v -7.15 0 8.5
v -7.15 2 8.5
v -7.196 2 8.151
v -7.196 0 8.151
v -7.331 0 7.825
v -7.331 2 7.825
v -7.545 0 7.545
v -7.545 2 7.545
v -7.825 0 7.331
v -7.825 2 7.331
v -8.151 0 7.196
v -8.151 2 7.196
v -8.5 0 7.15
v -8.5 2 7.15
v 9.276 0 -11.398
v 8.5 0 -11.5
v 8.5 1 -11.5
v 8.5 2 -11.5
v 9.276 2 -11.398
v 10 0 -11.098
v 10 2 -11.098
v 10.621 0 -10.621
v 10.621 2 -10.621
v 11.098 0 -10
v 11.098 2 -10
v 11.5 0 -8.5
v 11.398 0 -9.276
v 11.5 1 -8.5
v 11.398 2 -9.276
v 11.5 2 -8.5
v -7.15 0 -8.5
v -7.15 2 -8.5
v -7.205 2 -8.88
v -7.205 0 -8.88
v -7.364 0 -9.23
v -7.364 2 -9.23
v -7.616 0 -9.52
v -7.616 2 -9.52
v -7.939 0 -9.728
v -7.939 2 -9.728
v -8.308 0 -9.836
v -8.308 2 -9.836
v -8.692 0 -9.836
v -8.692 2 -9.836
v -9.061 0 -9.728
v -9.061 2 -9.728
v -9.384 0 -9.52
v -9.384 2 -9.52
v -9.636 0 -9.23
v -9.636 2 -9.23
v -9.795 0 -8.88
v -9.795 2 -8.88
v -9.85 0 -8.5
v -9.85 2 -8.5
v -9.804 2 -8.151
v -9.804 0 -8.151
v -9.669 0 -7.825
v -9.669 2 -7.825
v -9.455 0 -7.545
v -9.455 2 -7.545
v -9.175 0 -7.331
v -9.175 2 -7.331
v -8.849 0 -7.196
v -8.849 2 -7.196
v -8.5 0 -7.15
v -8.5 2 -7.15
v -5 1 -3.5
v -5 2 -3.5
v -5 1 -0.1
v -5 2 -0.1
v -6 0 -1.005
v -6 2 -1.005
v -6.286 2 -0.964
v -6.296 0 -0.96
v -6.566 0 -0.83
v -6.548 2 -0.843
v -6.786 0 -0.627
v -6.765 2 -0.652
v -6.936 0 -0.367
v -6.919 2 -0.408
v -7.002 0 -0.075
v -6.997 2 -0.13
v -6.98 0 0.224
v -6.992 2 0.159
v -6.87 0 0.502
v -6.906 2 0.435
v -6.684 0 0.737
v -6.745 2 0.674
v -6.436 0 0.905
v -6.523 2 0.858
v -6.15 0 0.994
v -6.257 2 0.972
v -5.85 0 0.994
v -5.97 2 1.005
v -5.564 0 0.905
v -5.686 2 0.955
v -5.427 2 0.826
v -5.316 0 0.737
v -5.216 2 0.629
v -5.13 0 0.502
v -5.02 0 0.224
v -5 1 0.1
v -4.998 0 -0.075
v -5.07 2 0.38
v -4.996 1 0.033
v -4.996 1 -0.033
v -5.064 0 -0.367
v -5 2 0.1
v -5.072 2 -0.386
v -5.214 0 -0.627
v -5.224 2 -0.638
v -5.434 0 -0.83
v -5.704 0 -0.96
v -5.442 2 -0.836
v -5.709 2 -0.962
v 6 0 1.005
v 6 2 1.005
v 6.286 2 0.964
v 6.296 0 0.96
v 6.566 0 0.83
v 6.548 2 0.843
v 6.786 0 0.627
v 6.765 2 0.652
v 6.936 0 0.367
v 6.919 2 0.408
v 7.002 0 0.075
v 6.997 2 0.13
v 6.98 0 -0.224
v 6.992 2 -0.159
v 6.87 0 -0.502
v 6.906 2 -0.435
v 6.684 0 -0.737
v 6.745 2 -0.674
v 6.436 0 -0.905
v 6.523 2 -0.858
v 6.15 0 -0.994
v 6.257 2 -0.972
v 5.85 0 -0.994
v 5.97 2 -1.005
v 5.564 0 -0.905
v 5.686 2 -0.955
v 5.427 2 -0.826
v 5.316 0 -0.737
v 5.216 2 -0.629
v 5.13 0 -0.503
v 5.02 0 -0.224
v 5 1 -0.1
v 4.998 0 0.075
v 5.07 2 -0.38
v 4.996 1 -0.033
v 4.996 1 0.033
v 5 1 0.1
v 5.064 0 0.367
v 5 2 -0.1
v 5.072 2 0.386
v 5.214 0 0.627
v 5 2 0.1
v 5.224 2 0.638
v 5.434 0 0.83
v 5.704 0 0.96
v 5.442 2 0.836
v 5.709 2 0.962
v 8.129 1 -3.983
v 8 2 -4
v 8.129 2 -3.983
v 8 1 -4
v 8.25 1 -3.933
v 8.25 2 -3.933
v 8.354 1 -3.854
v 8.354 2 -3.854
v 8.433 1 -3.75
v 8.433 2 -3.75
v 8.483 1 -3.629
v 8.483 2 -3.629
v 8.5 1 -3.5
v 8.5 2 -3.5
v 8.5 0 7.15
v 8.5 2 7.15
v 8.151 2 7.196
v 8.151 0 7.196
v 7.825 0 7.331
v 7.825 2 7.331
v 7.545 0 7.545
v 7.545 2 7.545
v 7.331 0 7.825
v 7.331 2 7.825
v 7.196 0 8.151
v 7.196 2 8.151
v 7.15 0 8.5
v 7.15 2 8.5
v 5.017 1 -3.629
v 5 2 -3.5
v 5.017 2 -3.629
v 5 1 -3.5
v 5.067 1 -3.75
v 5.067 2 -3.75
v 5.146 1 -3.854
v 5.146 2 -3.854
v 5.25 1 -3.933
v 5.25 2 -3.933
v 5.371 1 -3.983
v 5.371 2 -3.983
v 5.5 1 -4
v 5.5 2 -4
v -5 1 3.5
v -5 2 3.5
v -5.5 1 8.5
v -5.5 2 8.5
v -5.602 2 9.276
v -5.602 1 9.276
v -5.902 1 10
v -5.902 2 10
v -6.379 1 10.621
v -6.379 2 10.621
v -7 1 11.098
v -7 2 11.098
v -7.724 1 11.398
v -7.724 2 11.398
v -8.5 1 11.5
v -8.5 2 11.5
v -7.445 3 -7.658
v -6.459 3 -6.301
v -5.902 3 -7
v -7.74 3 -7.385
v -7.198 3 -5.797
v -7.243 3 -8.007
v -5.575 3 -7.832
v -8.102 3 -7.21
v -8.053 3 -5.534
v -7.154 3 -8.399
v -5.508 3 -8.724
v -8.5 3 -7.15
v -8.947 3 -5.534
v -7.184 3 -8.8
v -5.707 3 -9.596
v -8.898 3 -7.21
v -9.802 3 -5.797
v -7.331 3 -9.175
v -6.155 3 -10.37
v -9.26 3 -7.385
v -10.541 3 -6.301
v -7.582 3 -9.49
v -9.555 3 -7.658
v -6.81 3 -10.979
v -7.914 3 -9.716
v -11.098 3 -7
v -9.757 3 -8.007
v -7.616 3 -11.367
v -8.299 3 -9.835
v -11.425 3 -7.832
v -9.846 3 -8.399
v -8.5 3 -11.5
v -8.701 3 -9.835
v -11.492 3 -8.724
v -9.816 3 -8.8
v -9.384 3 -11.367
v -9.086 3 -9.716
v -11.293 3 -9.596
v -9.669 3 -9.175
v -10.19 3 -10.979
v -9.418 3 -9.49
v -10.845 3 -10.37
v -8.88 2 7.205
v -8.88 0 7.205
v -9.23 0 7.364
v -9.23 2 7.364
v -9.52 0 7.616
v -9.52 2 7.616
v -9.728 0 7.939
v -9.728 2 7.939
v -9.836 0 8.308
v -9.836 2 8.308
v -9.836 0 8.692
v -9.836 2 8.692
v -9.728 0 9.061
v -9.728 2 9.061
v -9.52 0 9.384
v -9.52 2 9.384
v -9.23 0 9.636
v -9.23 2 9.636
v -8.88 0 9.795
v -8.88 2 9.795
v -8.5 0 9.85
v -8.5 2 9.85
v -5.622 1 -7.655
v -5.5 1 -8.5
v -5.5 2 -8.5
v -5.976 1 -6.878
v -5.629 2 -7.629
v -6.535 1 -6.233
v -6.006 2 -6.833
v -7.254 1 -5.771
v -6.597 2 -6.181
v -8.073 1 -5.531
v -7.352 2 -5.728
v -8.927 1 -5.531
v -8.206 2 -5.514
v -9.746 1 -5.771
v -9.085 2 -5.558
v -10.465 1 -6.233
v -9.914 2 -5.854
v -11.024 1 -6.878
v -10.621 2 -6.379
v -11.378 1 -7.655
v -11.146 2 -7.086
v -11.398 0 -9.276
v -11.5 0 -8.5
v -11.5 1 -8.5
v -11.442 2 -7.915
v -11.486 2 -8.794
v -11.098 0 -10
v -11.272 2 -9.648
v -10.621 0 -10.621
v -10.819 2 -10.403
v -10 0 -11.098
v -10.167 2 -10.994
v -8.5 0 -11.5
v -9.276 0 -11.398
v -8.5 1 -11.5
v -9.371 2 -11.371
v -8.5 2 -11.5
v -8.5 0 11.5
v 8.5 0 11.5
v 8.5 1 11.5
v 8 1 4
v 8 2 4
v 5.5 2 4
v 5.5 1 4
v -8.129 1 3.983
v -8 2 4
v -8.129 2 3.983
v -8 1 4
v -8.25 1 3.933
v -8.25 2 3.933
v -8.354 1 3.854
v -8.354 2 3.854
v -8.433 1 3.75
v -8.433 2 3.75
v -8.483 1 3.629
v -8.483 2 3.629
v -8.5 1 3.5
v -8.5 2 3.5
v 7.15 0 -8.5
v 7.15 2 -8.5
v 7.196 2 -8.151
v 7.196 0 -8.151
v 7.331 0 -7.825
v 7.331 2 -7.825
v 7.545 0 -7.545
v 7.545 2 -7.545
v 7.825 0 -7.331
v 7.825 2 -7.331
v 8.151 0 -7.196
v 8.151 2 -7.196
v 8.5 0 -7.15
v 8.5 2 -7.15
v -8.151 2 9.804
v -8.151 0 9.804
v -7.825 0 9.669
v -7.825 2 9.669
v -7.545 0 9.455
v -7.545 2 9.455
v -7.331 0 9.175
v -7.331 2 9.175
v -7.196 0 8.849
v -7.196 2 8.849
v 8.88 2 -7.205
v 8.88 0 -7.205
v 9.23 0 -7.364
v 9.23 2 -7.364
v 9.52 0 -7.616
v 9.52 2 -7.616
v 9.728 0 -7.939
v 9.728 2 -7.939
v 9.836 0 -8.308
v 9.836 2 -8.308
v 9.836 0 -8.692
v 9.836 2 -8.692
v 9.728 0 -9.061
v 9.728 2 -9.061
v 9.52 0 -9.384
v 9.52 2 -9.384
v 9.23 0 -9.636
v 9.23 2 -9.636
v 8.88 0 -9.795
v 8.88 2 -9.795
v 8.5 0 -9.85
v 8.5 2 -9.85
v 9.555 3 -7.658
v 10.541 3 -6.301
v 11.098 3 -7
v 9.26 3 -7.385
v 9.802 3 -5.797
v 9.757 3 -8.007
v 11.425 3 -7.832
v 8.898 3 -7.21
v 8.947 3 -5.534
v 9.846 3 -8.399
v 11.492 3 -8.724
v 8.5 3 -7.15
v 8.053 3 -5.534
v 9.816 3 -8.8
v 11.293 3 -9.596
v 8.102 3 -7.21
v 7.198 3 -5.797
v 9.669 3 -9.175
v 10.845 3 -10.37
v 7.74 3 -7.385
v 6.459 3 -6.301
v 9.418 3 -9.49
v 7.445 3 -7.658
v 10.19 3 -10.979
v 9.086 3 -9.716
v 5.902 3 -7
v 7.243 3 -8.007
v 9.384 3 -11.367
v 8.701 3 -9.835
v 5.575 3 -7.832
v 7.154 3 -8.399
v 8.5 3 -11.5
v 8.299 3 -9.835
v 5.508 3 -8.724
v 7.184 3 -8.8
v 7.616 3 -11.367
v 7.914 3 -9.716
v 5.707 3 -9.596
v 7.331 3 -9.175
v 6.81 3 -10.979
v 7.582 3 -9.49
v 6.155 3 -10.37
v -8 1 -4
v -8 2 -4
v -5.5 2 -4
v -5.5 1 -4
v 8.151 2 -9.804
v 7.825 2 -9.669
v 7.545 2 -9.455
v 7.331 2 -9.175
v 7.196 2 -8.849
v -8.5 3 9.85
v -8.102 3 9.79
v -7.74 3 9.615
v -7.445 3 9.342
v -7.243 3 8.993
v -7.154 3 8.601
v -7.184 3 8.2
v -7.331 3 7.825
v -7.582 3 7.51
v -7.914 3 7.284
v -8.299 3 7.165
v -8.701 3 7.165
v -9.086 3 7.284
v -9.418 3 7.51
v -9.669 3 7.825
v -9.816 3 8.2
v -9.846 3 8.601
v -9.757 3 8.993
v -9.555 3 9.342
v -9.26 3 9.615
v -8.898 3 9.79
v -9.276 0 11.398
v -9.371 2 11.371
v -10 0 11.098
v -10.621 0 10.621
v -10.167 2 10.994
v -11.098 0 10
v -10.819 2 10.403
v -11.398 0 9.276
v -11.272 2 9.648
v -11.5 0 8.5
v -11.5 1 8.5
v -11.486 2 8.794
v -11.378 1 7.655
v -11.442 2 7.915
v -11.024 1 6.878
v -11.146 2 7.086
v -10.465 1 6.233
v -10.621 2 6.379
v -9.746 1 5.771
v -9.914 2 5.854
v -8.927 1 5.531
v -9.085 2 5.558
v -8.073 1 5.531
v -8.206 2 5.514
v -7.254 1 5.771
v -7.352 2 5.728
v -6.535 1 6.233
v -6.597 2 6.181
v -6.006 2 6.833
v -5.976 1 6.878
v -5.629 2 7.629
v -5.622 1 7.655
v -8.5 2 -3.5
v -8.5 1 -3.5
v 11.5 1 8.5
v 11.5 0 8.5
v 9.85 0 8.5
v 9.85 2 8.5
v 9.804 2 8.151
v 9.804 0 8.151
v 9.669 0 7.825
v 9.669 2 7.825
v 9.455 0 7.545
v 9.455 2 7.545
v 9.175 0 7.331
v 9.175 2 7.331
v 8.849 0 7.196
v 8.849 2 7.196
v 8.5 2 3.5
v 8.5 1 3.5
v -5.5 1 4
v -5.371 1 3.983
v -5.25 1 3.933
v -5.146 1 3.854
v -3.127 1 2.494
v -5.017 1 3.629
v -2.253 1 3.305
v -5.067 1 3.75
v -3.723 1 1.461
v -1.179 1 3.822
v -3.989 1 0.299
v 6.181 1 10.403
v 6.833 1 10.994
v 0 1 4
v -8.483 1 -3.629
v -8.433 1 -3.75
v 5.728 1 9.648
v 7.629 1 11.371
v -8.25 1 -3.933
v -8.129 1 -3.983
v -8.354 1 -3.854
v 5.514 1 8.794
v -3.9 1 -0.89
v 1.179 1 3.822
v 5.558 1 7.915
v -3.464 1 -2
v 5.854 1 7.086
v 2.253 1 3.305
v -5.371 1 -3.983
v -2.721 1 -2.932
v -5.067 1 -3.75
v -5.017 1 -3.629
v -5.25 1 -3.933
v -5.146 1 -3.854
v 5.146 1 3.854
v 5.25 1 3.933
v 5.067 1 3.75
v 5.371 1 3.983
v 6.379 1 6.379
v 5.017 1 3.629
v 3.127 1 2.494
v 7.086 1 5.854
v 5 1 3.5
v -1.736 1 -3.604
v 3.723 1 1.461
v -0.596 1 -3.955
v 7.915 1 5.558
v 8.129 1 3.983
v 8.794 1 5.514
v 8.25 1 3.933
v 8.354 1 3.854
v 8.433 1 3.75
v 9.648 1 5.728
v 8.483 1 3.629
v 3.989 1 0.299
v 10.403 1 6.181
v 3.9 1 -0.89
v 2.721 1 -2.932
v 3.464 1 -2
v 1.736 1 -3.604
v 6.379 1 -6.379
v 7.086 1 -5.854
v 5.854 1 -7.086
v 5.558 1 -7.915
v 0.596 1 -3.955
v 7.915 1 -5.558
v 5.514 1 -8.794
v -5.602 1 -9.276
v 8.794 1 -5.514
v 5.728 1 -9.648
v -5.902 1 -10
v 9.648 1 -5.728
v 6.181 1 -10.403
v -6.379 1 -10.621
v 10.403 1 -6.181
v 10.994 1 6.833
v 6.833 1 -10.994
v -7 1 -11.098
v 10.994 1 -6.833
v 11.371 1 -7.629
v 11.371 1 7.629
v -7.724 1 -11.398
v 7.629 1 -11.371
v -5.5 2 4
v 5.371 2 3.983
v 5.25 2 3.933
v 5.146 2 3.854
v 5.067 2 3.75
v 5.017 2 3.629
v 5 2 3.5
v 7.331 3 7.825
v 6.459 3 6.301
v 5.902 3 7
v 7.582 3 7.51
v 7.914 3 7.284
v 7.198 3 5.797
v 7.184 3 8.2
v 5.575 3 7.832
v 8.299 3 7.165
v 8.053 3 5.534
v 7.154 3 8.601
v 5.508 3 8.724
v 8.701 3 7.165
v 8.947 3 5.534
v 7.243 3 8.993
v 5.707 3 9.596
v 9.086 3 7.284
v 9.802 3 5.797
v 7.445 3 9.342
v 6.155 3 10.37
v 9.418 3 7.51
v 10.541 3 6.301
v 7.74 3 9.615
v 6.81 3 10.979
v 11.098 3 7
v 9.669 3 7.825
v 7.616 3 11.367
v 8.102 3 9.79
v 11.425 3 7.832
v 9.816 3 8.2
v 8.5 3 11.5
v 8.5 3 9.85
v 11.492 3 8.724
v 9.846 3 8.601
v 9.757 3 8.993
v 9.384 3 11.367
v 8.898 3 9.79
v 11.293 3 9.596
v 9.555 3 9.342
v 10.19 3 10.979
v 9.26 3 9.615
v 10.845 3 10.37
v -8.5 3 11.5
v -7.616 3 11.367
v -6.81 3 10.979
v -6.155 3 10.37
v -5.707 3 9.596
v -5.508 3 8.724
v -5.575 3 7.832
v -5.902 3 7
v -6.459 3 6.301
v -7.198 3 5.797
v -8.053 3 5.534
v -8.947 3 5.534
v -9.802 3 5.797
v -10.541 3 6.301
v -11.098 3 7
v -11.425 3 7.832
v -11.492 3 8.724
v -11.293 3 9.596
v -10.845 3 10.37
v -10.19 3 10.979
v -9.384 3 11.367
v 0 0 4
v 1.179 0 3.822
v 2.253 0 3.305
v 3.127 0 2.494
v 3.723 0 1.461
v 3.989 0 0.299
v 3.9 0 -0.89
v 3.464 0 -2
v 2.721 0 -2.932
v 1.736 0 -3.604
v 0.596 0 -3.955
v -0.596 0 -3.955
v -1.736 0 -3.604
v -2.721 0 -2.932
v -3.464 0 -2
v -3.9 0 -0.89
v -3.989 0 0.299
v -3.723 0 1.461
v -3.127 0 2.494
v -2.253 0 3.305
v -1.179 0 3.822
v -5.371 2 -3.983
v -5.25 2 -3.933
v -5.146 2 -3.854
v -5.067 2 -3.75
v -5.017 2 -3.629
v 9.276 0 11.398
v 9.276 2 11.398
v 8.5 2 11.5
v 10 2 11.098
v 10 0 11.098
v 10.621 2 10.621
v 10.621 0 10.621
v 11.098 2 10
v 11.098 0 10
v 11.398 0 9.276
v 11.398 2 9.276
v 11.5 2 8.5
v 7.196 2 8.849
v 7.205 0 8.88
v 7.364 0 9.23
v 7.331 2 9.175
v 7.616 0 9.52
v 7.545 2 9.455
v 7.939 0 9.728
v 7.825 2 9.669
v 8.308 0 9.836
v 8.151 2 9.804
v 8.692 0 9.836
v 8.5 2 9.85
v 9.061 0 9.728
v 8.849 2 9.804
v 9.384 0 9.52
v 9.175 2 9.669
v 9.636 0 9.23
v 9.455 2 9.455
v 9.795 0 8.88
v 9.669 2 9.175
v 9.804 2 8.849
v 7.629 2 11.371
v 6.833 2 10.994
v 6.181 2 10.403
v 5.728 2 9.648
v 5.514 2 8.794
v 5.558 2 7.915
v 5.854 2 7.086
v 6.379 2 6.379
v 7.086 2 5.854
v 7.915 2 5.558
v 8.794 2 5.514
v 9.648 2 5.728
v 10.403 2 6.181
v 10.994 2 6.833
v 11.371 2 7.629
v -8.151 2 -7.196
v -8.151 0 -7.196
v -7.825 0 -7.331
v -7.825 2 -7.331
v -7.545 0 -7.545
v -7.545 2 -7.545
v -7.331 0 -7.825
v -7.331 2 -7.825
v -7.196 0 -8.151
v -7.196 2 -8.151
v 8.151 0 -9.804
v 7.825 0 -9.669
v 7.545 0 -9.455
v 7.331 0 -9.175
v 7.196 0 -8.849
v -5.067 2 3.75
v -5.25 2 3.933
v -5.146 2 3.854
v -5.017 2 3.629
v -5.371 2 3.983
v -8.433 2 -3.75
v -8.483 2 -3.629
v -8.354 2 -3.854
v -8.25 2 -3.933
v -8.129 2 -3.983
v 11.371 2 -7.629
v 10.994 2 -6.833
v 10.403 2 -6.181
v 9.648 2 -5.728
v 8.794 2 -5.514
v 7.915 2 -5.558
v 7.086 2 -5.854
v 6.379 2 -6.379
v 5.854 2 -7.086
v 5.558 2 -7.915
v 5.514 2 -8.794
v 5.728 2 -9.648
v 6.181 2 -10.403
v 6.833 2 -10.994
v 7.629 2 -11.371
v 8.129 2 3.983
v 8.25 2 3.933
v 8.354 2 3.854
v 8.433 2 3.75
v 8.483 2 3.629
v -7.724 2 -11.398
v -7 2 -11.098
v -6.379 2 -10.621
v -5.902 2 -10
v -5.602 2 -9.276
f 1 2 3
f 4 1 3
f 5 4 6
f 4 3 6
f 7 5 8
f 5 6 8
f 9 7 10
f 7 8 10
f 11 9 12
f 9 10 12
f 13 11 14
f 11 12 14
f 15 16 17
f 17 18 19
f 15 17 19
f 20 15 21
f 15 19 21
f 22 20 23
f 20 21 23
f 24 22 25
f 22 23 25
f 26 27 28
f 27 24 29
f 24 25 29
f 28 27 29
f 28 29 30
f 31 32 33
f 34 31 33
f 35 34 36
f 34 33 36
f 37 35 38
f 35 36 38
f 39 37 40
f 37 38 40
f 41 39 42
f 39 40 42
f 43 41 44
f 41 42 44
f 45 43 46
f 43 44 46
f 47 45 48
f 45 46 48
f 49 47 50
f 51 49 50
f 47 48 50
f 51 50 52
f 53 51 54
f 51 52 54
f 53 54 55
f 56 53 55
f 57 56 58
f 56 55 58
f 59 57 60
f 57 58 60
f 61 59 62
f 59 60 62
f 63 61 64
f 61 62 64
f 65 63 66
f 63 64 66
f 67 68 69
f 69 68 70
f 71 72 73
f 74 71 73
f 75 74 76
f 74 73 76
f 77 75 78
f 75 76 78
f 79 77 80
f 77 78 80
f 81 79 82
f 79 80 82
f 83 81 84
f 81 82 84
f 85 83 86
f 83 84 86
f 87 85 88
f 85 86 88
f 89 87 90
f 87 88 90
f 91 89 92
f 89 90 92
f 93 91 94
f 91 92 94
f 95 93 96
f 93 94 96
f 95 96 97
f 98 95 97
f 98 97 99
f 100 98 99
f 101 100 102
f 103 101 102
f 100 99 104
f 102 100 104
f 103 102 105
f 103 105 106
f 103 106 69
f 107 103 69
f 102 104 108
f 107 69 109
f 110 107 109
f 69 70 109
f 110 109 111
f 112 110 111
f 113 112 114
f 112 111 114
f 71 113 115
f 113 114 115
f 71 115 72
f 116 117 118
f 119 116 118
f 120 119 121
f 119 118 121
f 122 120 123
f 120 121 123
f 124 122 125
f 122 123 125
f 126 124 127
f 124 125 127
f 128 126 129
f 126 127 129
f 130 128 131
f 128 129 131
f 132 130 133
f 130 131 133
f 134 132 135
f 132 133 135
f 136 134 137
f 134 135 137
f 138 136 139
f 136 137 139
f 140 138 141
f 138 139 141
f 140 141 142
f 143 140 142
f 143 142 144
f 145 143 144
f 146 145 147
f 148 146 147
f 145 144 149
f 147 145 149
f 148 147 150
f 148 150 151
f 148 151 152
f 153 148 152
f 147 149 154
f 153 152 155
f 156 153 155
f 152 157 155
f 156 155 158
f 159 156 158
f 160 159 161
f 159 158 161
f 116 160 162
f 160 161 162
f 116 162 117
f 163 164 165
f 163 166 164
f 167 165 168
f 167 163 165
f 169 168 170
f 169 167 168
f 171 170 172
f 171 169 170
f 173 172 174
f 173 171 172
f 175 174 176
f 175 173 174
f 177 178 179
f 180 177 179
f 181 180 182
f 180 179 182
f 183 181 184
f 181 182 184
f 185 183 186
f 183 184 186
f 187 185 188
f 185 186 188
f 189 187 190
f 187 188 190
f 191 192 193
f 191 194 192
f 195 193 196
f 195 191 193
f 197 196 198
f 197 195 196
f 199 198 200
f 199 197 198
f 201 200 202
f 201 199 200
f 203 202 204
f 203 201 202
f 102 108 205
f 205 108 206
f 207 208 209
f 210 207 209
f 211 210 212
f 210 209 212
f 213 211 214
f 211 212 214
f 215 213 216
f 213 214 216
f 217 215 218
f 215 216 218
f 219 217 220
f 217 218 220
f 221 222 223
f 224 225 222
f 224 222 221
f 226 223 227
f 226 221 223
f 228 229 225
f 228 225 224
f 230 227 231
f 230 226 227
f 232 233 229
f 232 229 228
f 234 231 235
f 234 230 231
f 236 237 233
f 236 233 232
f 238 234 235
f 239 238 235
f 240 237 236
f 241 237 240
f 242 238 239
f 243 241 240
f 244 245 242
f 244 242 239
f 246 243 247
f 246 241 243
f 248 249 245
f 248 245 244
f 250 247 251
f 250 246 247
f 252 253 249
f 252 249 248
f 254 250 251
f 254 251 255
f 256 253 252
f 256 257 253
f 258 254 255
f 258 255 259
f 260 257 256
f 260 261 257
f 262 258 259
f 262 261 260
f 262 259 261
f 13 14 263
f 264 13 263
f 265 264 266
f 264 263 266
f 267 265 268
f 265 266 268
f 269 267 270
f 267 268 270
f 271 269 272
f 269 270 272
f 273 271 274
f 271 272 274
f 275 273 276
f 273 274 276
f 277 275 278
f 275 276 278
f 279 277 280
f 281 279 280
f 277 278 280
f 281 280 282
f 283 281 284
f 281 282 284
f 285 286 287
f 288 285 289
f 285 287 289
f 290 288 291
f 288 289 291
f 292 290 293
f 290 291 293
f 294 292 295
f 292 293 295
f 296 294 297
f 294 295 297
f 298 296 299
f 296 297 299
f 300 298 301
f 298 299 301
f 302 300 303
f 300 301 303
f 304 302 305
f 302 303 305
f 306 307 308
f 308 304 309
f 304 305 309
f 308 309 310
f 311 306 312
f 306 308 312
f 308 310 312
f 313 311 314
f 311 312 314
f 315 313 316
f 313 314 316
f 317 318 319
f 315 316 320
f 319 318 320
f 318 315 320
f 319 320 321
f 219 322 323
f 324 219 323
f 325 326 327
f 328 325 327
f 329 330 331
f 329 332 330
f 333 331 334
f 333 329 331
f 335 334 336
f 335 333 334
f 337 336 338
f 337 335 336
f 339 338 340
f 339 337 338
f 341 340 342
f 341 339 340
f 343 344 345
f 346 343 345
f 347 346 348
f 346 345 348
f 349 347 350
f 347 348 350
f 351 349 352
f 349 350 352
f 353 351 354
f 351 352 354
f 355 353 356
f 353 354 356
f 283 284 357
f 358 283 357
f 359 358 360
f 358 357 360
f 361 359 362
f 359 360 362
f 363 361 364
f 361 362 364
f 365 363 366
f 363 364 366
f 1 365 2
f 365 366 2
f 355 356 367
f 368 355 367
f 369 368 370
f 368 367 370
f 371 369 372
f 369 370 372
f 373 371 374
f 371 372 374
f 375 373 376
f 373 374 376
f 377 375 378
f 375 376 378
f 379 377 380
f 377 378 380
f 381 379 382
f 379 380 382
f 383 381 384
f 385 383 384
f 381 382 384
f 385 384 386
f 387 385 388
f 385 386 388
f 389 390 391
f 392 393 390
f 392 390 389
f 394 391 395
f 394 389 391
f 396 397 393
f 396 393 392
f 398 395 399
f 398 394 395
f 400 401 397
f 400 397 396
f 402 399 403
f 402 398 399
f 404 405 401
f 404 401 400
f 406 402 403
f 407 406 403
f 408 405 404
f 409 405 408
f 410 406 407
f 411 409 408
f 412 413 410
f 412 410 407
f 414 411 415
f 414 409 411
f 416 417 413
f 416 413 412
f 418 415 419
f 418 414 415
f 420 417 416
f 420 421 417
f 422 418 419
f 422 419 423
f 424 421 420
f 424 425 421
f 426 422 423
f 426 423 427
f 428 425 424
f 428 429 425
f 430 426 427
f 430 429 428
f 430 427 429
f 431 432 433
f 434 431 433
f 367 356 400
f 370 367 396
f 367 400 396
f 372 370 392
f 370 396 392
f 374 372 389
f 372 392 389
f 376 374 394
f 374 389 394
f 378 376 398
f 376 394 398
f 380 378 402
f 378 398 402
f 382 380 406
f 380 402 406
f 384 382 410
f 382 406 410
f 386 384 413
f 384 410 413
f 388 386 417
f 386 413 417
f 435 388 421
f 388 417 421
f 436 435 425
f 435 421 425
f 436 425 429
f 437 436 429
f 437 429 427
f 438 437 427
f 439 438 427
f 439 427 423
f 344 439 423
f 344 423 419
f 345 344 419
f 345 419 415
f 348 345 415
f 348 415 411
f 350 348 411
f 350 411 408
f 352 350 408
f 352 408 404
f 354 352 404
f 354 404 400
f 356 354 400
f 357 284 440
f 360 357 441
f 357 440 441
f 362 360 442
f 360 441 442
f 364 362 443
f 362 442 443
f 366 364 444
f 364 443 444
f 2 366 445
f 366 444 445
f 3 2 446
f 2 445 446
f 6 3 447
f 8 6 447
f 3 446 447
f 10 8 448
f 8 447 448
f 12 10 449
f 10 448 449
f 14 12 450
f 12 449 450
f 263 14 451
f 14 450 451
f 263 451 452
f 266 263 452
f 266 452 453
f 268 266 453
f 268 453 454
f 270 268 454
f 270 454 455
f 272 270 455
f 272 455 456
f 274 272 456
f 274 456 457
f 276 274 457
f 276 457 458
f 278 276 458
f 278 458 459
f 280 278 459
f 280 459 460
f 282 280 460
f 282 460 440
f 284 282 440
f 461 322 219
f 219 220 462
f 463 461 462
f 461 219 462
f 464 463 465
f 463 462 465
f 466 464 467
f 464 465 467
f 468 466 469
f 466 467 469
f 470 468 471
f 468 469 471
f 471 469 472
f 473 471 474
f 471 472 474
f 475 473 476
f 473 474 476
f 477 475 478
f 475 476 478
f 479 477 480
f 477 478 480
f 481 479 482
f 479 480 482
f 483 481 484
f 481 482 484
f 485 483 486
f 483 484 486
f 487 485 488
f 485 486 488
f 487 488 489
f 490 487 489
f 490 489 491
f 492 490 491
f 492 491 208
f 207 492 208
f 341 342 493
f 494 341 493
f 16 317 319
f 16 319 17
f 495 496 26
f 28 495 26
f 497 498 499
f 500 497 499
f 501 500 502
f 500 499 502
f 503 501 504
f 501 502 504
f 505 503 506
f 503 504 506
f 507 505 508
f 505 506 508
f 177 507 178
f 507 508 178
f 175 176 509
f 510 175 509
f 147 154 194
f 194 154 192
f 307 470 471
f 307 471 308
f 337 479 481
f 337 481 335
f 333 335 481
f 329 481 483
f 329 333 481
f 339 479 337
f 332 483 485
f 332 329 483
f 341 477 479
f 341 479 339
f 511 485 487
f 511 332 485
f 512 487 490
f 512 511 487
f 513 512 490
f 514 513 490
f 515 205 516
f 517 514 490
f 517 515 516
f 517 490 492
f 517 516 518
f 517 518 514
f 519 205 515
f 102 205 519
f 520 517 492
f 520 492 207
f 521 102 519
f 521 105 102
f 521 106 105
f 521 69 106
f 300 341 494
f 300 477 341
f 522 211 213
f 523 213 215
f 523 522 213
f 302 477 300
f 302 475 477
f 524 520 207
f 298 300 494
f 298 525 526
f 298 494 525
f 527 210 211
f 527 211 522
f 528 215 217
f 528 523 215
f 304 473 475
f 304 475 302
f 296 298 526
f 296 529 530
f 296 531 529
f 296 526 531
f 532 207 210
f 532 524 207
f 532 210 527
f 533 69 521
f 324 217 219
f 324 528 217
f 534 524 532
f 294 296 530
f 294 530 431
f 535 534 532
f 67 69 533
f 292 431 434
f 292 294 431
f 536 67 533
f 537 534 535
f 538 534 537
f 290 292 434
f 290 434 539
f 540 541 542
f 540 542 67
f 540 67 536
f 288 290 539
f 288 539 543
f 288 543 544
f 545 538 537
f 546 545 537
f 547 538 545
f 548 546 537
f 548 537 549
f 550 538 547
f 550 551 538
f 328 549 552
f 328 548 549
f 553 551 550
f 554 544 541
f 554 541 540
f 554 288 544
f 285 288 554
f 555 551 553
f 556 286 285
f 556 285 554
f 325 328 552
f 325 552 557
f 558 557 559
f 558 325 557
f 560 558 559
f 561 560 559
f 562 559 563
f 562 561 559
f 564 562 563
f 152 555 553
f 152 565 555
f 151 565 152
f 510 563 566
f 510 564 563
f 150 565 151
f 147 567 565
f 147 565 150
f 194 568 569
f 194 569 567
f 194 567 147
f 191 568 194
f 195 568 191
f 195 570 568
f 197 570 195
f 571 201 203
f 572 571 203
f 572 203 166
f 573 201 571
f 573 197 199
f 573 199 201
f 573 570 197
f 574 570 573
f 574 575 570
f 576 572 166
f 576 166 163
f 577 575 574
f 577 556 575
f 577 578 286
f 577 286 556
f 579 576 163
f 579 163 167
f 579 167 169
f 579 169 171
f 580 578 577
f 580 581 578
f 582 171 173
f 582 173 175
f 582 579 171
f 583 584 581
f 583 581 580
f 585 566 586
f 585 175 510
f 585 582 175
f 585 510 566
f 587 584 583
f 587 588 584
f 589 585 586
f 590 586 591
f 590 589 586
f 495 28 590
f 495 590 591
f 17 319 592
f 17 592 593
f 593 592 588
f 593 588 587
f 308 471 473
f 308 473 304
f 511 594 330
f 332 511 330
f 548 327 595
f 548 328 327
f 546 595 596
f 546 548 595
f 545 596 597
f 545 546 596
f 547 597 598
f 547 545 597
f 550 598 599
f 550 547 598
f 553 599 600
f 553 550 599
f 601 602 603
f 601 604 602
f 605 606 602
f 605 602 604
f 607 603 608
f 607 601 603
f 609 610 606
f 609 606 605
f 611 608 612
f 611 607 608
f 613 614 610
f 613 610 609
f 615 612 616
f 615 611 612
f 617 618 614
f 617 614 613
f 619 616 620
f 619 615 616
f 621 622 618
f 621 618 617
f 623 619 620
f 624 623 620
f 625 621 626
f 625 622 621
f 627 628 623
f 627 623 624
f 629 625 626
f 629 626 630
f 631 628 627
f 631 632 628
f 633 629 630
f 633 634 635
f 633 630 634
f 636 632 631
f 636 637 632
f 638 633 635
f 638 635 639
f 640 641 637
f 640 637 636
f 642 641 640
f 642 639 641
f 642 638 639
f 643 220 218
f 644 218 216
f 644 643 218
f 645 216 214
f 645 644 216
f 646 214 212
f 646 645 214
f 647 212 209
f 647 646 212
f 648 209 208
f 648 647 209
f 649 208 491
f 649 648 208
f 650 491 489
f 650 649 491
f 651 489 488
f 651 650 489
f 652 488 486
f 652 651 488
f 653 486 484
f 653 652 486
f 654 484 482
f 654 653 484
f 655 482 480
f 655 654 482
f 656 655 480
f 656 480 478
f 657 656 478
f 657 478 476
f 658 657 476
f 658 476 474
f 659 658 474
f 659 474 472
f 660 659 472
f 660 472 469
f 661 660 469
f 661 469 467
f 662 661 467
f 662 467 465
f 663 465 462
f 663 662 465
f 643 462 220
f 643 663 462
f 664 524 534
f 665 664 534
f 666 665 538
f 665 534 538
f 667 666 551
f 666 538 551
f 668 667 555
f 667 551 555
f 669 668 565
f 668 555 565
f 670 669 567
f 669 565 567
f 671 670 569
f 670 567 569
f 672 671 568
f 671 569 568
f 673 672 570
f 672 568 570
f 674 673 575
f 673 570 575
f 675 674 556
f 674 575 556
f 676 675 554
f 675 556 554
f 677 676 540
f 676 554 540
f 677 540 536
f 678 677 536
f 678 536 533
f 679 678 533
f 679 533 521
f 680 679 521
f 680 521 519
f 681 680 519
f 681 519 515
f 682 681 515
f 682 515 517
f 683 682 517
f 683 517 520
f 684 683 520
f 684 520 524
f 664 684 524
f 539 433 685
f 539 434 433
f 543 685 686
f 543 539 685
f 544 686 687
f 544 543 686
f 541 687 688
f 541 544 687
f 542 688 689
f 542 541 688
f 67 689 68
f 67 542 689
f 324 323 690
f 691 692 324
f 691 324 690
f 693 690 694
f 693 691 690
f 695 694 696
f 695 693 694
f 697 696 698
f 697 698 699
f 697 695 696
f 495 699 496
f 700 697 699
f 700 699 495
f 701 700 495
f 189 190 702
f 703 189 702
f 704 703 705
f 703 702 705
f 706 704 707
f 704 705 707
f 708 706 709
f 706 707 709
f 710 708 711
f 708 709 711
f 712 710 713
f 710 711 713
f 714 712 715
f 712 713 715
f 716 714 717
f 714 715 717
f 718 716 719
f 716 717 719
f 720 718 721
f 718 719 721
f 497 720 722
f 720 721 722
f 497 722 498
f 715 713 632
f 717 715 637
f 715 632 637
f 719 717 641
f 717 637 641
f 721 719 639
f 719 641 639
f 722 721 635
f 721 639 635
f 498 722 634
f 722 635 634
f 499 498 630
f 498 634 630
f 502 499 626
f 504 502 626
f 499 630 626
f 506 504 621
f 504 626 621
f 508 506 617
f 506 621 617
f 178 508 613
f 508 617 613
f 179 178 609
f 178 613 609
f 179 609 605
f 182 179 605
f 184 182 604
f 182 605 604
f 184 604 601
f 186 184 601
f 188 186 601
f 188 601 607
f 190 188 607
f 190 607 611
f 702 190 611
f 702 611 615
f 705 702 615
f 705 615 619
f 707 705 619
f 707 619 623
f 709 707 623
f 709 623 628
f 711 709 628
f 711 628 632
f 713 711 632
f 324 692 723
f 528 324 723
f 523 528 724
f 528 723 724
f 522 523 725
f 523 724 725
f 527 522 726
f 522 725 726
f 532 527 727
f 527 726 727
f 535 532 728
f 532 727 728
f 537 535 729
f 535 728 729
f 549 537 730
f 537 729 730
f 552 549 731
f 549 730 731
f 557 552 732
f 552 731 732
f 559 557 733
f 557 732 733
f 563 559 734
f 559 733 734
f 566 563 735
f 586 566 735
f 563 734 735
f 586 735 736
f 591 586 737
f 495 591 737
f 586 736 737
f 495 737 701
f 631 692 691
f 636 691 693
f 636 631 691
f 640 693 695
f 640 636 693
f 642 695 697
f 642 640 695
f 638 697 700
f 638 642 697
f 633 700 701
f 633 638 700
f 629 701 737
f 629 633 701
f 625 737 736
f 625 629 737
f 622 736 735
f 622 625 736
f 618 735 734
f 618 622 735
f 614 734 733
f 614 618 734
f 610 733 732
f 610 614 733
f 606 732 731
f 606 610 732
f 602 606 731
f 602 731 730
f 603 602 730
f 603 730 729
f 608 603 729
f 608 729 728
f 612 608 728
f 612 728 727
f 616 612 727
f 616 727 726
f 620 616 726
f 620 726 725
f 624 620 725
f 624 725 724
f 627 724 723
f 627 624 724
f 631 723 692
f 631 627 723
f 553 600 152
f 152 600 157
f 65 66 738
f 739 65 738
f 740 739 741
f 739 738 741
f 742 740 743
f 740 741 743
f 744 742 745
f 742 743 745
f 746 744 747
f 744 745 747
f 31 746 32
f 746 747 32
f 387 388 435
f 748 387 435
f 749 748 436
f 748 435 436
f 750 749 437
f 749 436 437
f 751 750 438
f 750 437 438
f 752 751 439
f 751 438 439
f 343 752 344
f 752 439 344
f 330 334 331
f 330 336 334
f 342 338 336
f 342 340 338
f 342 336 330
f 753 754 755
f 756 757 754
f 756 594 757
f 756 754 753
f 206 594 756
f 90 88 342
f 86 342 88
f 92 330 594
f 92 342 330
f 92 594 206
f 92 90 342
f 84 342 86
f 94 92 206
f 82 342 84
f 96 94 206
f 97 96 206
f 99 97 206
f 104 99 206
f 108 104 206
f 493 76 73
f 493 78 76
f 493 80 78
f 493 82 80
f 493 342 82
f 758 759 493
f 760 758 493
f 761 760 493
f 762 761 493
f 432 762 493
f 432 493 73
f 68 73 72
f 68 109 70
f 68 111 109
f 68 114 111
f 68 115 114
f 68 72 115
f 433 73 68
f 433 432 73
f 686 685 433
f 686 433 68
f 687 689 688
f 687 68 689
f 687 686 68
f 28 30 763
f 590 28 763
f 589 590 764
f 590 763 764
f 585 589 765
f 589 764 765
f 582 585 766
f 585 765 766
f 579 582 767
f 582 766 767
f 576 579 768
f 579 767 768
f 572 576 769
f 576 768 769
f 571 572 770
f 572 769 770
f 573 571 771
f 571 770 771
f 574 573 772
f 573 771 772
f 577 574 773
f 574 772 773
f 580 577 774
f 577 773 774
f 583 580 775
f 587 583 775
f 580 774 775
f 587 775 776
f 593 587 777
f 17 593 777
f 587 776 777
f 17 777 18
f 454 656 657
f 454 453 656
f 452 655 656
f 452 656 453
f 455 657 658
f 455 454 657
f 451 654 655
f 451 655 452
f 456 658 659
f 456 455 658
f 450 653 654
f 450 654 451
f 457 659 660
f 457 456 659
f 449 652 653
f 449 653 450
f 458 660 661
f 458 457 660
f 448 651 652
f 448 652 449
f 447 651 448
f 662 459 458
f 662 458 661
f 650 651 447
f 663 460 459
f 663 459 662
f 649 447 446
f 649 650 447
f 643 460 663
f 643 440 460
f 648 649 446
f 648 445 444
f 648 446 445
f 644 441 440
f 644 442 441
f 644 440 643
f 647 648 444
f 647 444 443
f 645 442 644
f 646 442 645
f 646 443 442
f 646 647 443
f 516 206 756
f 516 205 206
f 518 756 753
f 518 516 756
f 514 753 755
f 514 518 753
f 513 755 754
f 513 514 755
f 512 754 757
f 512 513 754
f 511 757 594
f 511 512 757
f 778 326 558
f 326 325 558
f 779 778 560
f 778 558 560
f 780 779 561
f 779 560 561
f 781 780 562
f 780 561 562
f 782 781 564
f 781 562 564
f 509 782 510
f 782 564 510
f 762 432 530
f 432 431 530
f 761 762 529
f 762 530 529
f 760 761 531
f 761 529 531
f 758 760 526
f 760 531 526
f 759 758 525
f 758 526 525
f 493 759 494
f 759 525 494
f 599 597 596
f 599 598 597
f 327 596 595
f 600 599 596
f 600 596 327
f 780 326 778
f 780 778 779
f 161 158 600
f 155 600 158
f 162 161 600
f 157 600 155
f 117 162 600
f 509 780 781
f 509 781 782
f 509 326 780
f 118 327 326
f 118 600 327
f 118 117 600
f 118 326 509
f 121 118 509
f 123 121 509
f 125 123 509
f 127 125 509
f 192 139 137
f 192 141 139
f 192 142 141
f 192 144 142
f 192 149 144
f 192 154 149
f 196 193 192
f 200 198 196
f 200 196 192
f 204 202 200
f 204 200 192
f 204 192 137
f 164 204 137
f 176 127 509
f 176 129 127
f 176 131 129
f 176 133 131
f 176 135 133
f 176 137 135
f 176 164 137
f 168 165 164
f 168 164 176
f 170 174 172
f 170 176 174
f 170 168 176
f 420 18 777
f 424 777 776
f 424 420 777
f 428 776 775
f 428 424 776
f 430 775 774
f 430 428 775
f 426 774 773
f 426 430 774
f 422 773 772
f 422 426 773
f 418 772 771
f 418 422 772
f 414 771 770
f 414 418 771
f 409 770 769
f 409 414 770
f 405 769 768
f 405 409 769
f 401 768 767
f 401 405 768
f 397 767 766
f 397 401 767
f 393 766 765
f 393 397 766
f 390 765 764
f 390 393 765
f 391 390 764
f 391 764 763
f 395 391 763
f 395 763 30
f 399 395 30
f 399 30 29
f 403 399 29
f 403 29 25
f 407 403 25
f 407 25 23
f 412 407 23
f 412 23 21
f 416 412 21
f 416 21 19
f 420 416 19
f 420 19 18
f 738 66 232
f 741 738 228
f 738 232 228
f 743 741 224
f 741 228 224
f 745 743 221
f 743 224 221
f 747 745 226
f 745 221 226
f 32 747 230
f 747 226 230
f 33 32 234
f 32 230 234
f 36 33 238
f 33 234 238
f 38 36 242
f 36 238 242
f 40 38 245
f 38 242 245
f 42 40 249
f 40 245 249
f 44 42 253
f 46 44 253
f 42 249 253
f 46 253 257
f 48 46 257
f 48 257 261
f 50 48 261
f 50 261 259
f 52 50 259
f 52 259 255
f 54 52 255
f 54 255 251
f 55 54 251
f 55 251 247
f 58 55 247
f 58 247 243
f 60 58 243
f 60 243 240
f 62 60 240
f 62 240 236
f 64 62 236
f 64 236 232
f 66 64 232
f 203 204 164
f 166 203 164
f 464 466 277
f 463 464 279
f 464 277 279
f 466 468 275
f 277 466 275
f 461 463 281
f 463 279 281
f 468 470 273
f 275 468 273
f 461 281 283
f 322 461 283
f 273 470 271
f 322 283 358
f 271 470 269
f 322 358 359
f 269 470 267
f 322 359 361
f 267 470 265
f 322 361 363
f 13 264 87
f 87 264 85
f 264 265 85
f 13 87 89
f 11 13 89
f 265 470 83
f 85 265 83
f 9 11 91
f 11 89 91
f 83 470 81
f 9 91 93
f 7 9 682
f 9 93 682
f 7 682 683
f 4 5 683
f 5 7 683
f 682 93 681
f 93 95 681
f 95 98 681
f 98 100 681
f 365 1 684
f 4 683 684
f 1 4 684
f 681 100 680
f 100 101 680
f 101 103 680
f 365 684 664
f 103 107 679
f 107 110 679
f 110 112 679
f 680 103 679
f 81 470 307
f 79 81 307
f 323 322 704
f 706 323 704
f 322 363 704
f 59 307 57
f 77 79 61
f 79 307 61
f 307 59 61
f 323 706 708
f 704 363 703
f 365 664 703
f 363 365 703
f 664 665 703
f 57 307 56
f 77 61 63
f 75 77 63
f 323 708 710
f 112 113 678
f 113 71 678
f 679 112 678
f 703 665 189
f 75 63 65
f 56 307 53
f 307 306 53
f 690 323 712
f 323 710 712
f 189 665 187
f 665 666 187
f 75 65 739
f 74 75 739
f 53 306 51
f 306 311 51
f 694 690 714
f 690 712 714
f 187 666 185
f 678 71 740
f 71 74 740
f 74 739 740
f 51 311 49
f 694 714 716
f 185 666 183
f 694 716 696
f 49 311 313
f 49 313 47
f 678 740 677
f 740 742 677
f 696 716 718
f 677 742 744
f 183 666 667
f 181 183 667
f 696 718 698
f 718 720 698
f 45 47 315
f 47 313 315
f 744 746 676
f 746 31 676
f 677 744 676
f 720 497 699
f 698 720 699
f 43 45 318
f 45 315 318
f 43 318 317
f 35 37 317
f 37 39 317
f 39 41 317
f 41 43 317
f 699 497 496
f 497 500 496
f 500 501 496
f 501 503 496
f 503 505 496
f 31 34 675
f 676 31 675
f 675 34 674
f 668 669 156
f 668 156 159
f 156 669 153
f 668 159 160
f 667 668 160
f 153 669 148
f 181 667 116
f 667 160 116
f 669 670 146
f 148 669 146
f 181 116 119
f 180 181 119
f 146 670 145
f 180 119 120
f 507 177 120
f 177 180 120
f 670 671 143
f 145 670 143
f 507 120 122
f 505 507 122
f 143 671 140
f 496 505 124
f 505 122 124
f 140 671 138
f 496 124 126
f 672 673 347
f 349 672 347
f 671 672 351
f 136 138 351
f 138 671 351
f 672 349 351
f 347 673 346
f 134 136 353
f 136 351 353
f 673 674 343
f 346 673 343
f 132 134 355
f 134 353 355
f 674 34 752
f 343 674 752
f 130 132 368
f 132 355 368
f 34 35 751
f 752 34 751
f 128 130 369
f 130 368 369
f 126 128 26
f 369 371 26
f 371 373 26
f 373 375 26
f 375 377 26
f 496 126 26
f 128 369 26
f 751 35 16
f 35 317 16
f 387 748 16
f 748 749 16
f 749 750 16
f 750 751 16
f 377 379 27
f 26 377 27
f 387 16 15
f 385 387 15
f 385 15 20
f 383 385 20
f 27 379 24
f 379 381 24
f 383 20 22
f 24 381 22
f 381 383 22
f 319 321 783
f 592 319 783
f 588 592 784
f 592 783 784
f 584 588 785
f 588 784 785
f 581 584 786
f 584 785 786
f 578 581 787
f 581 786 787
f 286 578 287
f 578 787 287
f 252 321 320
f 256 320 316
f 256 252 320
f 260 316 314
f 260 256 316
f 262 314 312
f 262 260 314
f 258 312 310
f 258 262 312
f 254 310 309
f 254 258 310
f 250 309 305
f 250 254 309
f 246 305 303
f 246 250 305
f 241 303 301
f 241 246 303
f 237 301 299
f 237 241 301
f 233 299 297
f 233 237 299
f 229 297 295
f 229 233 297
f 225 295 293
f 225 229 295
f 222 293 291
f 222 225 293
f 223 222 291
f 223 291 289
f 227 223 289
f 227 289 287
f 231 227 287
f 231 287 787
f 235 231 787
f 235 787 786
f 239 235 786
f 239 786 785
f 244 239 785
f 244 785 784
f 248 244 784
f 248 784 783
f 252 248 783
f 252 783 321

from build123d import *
from build123d.topology import SkipClean

# Parameters (mm, degrees)
SKETCH_1_W               = 23
SKETCH_1_H               = 23
EXTRUDE_1_DEPTH          = 2
SKETCH_2_R               = 1.35
CUT_EXTRUDE_1_DEPTH      = 2
PATTERN_CIRCULAR_1_COUNT = 4
FILLET_1_R               = 3
SKETCH_3_R               = 4
CUT_EXTRUDE_2_DEPTH      = 2
CUT_EXTRUDE_6_DEPTH      = 1
FILLET_2_R               = 0.5
CUT_EXTRUDE_7_DEPTH      = 2
PATTERN_CIRCULAR_2_COUNT = 2
EXTRUDE_START            = 1
SKETCH_6_R               = 3
SKETCH_6_R_2             = 1.35
EXTRUDE_2_DEPTH          = 1


with BuildPart() as part:
    # 草图1 → 凸台-拉伸1 (new body)
    with BuildSketch(Plane(origin=(0, 0, 0), x_dir=(1, 0, 0), z_dir=(0, 1, 0))):
        Rectangle(SKETCH_1_W, SKETCH_1_H)
    extrude(amount=EXTRUDE_1_DEPTH)

    # 草图2 → 切除-拉伸1 (cut)
    with BuildSketch(Plane(origin=(0, 2, 0), x_dir=(1, 0, 0), z_dir=(0, 1, 0))):
        with Locations((8.5, -8.5)):
            Circle(SKETCH_2_R)
    cut_extrude_1 = extrude(amount=-CUT_EXTRUDE_1_DEPTH, mode=Mode.SUBTRACT)

    # 阵列(圆周)1: 切除-拉伸1 ×4 about axis
    pattern_circular_1_axis = Axis((0, 0, 0), (0, 1, 0))
    for i in range(1, PATTERN_CIRCULAR_1_COUNT):
        add(cut_extrude_1.rotate(pattern_circular_1_axis, i * 360 / PATTERN_CIRCULAR_1_COUNT), mode=Mode.SUBTRACT)

    # 圆角1
    fillet_1_edges = [part.edges().sort_by_distance(p)[0] for p in [
        (-11.5, 1, 11.5),
        (11.5, 1, 11.5),
        (11.5, 1, -11.5),
        (-11.5, 1, -11.5),
    ]]
    fillet(fillet_1_edges, radius=FILLET_1_R)

    # 草图3 → 切除-拉伸2 (cut)
    with BuildSketch(Plane(origin=(0, 2, 0), x_dir=(1, 0, 0), z_dir=(0, 1, 0))):
        Circle(SKETCH_3_R)
    extrude(amount=-CUT_EXTRUDE_2_DEPTH, mode=Mode.SUBTRACT)

    # 草图4 → 切除-拉伸6 (cut)
    with SkipClean():  # the faces are left unmerged after this step: merging them gives an invalid solid
        with BuildSketch(Plane(origin=(0, 2, 0), x_dir=(1, 0, 0), z_dir=(0, 1, 0))):
            with BuildLine():
                ThreePointArc((-5.5, -8.5), (-6.37868, -10.62132), (-8.5, -11.5))
                Line((-8.5, -11.5), (8.5, -11.5))
                ThreePointArc((8.5, -11.5), (6.37868, -6.37868), (11.5, -8.5))
                Line((11.5, -8.5), (11.5, 8.5))
                ThreePointArc((11.5, 8.5), (6.37868, 6.37868), (8.5, 11.5))
                Line((8.5, 11.5), (-8.5, 11.5))
                ThreePointArc((-8.5, 11.5), (-6.37868, 10.62132), (-5.5, 8.5))
                ThreePointArc((-5.5, 8.5), (-8.5, 5.5), (-11.5, 8.5))
                Line((-11.5, 8.5), (-11.5, -8.5))
                ThreePointArc((-11.5, -8.5), (-8.5, -5.5), (-5.5, -8.5))
            make_face()
            Polygon((-5, 4), (-5, 0), (-5, -4), (-8.5, -4), (-8.5, 4), align=None, mode=Mode.SUBTRACT)
            with BuildLine():
                ThreePointArc((4, 0), (0, -4), (-4, 0))
                ThreePointArc((-4, 0), (0, 4), (4, 0))
            make_face(mode=Mode.SUBTRACT)
            Polygon((5, -4), (5, 0), (5, 4), (8.5, 4), (8.5, -4), align=None, mode=Mode.SUBTRACT)
        extrude(amount=-CUT_EXTRUDE_6_DEPTH, mode=Mode.SUBTRACT)

    # 圆角2
    fillet_2_edges = [part.edges().sort_by_distance(p)[0] for p in [
        (-8.5, 1.5, -4),
        (-5, 1.5, 4),
        (-5, 1.5, -4),
        (8.5, 1.5, 4),
        (8.5, 1.5, -4),
        (5, 1.5, -4),
        (5, 1.5, 4),
        (-8.5, 1.5, 4),
    ]]
    fillet(fillet_2_edges, radius=FILLET_2_R)

    # 草图5 → 切除-拉伸7 (cut)
    with SkipClean():  # the faces are left unmerged after this step: merging them gives an invalid solid
        with BuildSketch(Plane(origin=(0, 2, 0), x_dir=(1, 0, 0), z_dir=(0, 1, 0))):
            with BuildLine():
                ThreePointArc((4.995, 0), (6, -1.005), (7.005, 0))
                ThreePointArc((7.005, 0), (6, 1.005), (4.995, 0))
            make_face()
        cut_extrude_7 = extrude(amount=-CUT_EXTRUDE_7_DEPTH, mode=Mode.SUBTRACT)

    # 阵列(圆周)2: 切除-拉伸7 ×2 about axis
    with SkipClean():  # the faces are left unmerged after this step: merging them gives an invalid solid
        pattern_circular_2_axis = Axis((0, 0, 0), (0, 1, 0))
        for i in range(1, PATTERN_CIRCULAR_2_COUNT):
            add(cut_extrude_7.rotate(pattern_circular_2_axis, i * 360 / PATTERN_CIRCULAR_2_COUNT), mode=Mode.SUBTRACT)

    # 草图6 → 凸台-拉伸2 (add)
    # profile 1 of 4: a face of its own
    with SkipClean():  # the faces are left unmerged after this step: merging them gives an invalid solid
        with BuildSketch(Plane(origin=(0, 2, 0), x_dir=(1, 0, 0), z_dir=(0, 1, 0)).offset(EXTRUDE_START)):
            with Locations((-8.5, -8.5)):
                Circle(SKETCH_6_R)
            with Locations((-8.5, -8.5)):
                Circle(SKETCH_6_R_2, mode=Mode.SUBTRACT)
        # profile 2 of 4: a face of its own
        with BuildSketch(Plane(origin=(0, 2, 0), x_dir=(1, 0, 0), z_dir=(0, 1, 0)).offset(EXTRUDE_START)):
            with Locations((8.5, -8.5)):
                Circle(SKETCH_6_R)
            with Locations((8.5, -8.5)):
                Circle(SKETCH_6_R_2, mode=Mode.SUBTRACT)
        # profile 3 of 4: a face of its own
        with BuildSketch(Plane(origin=(0, 2, 0), x_dir=(1, 0, 0), z_dir=(0, 1, 0)).offset(EXTRUDE_START)):
            with Locations((8.5, 8.5)):
                Circle(SKETCH_6_R)
            with Locations((8.5, 8.5)):
                Circle(SKETCH_6_R_2, mode=Mode.SUBTRACT)
        # profile 4 of 4: a face of its own
        with BuildSketch(Plane(origin=(0, 2, 0), x_dir=(1, 0, 0), z_dir=(0, 1, 0)).offset(EXTRUDE_START)):
            with Locations((-8.5, 8.5)):
                Circle(SKETCH_6_R)
            with Locations((-8.5, 8.5)):
                Circle(SKETCH_6_R_2, mode=Mode.SUBTRACT)
        extrude(amount=-EXTRUDE_2_DEPTH)


solid = part.part
